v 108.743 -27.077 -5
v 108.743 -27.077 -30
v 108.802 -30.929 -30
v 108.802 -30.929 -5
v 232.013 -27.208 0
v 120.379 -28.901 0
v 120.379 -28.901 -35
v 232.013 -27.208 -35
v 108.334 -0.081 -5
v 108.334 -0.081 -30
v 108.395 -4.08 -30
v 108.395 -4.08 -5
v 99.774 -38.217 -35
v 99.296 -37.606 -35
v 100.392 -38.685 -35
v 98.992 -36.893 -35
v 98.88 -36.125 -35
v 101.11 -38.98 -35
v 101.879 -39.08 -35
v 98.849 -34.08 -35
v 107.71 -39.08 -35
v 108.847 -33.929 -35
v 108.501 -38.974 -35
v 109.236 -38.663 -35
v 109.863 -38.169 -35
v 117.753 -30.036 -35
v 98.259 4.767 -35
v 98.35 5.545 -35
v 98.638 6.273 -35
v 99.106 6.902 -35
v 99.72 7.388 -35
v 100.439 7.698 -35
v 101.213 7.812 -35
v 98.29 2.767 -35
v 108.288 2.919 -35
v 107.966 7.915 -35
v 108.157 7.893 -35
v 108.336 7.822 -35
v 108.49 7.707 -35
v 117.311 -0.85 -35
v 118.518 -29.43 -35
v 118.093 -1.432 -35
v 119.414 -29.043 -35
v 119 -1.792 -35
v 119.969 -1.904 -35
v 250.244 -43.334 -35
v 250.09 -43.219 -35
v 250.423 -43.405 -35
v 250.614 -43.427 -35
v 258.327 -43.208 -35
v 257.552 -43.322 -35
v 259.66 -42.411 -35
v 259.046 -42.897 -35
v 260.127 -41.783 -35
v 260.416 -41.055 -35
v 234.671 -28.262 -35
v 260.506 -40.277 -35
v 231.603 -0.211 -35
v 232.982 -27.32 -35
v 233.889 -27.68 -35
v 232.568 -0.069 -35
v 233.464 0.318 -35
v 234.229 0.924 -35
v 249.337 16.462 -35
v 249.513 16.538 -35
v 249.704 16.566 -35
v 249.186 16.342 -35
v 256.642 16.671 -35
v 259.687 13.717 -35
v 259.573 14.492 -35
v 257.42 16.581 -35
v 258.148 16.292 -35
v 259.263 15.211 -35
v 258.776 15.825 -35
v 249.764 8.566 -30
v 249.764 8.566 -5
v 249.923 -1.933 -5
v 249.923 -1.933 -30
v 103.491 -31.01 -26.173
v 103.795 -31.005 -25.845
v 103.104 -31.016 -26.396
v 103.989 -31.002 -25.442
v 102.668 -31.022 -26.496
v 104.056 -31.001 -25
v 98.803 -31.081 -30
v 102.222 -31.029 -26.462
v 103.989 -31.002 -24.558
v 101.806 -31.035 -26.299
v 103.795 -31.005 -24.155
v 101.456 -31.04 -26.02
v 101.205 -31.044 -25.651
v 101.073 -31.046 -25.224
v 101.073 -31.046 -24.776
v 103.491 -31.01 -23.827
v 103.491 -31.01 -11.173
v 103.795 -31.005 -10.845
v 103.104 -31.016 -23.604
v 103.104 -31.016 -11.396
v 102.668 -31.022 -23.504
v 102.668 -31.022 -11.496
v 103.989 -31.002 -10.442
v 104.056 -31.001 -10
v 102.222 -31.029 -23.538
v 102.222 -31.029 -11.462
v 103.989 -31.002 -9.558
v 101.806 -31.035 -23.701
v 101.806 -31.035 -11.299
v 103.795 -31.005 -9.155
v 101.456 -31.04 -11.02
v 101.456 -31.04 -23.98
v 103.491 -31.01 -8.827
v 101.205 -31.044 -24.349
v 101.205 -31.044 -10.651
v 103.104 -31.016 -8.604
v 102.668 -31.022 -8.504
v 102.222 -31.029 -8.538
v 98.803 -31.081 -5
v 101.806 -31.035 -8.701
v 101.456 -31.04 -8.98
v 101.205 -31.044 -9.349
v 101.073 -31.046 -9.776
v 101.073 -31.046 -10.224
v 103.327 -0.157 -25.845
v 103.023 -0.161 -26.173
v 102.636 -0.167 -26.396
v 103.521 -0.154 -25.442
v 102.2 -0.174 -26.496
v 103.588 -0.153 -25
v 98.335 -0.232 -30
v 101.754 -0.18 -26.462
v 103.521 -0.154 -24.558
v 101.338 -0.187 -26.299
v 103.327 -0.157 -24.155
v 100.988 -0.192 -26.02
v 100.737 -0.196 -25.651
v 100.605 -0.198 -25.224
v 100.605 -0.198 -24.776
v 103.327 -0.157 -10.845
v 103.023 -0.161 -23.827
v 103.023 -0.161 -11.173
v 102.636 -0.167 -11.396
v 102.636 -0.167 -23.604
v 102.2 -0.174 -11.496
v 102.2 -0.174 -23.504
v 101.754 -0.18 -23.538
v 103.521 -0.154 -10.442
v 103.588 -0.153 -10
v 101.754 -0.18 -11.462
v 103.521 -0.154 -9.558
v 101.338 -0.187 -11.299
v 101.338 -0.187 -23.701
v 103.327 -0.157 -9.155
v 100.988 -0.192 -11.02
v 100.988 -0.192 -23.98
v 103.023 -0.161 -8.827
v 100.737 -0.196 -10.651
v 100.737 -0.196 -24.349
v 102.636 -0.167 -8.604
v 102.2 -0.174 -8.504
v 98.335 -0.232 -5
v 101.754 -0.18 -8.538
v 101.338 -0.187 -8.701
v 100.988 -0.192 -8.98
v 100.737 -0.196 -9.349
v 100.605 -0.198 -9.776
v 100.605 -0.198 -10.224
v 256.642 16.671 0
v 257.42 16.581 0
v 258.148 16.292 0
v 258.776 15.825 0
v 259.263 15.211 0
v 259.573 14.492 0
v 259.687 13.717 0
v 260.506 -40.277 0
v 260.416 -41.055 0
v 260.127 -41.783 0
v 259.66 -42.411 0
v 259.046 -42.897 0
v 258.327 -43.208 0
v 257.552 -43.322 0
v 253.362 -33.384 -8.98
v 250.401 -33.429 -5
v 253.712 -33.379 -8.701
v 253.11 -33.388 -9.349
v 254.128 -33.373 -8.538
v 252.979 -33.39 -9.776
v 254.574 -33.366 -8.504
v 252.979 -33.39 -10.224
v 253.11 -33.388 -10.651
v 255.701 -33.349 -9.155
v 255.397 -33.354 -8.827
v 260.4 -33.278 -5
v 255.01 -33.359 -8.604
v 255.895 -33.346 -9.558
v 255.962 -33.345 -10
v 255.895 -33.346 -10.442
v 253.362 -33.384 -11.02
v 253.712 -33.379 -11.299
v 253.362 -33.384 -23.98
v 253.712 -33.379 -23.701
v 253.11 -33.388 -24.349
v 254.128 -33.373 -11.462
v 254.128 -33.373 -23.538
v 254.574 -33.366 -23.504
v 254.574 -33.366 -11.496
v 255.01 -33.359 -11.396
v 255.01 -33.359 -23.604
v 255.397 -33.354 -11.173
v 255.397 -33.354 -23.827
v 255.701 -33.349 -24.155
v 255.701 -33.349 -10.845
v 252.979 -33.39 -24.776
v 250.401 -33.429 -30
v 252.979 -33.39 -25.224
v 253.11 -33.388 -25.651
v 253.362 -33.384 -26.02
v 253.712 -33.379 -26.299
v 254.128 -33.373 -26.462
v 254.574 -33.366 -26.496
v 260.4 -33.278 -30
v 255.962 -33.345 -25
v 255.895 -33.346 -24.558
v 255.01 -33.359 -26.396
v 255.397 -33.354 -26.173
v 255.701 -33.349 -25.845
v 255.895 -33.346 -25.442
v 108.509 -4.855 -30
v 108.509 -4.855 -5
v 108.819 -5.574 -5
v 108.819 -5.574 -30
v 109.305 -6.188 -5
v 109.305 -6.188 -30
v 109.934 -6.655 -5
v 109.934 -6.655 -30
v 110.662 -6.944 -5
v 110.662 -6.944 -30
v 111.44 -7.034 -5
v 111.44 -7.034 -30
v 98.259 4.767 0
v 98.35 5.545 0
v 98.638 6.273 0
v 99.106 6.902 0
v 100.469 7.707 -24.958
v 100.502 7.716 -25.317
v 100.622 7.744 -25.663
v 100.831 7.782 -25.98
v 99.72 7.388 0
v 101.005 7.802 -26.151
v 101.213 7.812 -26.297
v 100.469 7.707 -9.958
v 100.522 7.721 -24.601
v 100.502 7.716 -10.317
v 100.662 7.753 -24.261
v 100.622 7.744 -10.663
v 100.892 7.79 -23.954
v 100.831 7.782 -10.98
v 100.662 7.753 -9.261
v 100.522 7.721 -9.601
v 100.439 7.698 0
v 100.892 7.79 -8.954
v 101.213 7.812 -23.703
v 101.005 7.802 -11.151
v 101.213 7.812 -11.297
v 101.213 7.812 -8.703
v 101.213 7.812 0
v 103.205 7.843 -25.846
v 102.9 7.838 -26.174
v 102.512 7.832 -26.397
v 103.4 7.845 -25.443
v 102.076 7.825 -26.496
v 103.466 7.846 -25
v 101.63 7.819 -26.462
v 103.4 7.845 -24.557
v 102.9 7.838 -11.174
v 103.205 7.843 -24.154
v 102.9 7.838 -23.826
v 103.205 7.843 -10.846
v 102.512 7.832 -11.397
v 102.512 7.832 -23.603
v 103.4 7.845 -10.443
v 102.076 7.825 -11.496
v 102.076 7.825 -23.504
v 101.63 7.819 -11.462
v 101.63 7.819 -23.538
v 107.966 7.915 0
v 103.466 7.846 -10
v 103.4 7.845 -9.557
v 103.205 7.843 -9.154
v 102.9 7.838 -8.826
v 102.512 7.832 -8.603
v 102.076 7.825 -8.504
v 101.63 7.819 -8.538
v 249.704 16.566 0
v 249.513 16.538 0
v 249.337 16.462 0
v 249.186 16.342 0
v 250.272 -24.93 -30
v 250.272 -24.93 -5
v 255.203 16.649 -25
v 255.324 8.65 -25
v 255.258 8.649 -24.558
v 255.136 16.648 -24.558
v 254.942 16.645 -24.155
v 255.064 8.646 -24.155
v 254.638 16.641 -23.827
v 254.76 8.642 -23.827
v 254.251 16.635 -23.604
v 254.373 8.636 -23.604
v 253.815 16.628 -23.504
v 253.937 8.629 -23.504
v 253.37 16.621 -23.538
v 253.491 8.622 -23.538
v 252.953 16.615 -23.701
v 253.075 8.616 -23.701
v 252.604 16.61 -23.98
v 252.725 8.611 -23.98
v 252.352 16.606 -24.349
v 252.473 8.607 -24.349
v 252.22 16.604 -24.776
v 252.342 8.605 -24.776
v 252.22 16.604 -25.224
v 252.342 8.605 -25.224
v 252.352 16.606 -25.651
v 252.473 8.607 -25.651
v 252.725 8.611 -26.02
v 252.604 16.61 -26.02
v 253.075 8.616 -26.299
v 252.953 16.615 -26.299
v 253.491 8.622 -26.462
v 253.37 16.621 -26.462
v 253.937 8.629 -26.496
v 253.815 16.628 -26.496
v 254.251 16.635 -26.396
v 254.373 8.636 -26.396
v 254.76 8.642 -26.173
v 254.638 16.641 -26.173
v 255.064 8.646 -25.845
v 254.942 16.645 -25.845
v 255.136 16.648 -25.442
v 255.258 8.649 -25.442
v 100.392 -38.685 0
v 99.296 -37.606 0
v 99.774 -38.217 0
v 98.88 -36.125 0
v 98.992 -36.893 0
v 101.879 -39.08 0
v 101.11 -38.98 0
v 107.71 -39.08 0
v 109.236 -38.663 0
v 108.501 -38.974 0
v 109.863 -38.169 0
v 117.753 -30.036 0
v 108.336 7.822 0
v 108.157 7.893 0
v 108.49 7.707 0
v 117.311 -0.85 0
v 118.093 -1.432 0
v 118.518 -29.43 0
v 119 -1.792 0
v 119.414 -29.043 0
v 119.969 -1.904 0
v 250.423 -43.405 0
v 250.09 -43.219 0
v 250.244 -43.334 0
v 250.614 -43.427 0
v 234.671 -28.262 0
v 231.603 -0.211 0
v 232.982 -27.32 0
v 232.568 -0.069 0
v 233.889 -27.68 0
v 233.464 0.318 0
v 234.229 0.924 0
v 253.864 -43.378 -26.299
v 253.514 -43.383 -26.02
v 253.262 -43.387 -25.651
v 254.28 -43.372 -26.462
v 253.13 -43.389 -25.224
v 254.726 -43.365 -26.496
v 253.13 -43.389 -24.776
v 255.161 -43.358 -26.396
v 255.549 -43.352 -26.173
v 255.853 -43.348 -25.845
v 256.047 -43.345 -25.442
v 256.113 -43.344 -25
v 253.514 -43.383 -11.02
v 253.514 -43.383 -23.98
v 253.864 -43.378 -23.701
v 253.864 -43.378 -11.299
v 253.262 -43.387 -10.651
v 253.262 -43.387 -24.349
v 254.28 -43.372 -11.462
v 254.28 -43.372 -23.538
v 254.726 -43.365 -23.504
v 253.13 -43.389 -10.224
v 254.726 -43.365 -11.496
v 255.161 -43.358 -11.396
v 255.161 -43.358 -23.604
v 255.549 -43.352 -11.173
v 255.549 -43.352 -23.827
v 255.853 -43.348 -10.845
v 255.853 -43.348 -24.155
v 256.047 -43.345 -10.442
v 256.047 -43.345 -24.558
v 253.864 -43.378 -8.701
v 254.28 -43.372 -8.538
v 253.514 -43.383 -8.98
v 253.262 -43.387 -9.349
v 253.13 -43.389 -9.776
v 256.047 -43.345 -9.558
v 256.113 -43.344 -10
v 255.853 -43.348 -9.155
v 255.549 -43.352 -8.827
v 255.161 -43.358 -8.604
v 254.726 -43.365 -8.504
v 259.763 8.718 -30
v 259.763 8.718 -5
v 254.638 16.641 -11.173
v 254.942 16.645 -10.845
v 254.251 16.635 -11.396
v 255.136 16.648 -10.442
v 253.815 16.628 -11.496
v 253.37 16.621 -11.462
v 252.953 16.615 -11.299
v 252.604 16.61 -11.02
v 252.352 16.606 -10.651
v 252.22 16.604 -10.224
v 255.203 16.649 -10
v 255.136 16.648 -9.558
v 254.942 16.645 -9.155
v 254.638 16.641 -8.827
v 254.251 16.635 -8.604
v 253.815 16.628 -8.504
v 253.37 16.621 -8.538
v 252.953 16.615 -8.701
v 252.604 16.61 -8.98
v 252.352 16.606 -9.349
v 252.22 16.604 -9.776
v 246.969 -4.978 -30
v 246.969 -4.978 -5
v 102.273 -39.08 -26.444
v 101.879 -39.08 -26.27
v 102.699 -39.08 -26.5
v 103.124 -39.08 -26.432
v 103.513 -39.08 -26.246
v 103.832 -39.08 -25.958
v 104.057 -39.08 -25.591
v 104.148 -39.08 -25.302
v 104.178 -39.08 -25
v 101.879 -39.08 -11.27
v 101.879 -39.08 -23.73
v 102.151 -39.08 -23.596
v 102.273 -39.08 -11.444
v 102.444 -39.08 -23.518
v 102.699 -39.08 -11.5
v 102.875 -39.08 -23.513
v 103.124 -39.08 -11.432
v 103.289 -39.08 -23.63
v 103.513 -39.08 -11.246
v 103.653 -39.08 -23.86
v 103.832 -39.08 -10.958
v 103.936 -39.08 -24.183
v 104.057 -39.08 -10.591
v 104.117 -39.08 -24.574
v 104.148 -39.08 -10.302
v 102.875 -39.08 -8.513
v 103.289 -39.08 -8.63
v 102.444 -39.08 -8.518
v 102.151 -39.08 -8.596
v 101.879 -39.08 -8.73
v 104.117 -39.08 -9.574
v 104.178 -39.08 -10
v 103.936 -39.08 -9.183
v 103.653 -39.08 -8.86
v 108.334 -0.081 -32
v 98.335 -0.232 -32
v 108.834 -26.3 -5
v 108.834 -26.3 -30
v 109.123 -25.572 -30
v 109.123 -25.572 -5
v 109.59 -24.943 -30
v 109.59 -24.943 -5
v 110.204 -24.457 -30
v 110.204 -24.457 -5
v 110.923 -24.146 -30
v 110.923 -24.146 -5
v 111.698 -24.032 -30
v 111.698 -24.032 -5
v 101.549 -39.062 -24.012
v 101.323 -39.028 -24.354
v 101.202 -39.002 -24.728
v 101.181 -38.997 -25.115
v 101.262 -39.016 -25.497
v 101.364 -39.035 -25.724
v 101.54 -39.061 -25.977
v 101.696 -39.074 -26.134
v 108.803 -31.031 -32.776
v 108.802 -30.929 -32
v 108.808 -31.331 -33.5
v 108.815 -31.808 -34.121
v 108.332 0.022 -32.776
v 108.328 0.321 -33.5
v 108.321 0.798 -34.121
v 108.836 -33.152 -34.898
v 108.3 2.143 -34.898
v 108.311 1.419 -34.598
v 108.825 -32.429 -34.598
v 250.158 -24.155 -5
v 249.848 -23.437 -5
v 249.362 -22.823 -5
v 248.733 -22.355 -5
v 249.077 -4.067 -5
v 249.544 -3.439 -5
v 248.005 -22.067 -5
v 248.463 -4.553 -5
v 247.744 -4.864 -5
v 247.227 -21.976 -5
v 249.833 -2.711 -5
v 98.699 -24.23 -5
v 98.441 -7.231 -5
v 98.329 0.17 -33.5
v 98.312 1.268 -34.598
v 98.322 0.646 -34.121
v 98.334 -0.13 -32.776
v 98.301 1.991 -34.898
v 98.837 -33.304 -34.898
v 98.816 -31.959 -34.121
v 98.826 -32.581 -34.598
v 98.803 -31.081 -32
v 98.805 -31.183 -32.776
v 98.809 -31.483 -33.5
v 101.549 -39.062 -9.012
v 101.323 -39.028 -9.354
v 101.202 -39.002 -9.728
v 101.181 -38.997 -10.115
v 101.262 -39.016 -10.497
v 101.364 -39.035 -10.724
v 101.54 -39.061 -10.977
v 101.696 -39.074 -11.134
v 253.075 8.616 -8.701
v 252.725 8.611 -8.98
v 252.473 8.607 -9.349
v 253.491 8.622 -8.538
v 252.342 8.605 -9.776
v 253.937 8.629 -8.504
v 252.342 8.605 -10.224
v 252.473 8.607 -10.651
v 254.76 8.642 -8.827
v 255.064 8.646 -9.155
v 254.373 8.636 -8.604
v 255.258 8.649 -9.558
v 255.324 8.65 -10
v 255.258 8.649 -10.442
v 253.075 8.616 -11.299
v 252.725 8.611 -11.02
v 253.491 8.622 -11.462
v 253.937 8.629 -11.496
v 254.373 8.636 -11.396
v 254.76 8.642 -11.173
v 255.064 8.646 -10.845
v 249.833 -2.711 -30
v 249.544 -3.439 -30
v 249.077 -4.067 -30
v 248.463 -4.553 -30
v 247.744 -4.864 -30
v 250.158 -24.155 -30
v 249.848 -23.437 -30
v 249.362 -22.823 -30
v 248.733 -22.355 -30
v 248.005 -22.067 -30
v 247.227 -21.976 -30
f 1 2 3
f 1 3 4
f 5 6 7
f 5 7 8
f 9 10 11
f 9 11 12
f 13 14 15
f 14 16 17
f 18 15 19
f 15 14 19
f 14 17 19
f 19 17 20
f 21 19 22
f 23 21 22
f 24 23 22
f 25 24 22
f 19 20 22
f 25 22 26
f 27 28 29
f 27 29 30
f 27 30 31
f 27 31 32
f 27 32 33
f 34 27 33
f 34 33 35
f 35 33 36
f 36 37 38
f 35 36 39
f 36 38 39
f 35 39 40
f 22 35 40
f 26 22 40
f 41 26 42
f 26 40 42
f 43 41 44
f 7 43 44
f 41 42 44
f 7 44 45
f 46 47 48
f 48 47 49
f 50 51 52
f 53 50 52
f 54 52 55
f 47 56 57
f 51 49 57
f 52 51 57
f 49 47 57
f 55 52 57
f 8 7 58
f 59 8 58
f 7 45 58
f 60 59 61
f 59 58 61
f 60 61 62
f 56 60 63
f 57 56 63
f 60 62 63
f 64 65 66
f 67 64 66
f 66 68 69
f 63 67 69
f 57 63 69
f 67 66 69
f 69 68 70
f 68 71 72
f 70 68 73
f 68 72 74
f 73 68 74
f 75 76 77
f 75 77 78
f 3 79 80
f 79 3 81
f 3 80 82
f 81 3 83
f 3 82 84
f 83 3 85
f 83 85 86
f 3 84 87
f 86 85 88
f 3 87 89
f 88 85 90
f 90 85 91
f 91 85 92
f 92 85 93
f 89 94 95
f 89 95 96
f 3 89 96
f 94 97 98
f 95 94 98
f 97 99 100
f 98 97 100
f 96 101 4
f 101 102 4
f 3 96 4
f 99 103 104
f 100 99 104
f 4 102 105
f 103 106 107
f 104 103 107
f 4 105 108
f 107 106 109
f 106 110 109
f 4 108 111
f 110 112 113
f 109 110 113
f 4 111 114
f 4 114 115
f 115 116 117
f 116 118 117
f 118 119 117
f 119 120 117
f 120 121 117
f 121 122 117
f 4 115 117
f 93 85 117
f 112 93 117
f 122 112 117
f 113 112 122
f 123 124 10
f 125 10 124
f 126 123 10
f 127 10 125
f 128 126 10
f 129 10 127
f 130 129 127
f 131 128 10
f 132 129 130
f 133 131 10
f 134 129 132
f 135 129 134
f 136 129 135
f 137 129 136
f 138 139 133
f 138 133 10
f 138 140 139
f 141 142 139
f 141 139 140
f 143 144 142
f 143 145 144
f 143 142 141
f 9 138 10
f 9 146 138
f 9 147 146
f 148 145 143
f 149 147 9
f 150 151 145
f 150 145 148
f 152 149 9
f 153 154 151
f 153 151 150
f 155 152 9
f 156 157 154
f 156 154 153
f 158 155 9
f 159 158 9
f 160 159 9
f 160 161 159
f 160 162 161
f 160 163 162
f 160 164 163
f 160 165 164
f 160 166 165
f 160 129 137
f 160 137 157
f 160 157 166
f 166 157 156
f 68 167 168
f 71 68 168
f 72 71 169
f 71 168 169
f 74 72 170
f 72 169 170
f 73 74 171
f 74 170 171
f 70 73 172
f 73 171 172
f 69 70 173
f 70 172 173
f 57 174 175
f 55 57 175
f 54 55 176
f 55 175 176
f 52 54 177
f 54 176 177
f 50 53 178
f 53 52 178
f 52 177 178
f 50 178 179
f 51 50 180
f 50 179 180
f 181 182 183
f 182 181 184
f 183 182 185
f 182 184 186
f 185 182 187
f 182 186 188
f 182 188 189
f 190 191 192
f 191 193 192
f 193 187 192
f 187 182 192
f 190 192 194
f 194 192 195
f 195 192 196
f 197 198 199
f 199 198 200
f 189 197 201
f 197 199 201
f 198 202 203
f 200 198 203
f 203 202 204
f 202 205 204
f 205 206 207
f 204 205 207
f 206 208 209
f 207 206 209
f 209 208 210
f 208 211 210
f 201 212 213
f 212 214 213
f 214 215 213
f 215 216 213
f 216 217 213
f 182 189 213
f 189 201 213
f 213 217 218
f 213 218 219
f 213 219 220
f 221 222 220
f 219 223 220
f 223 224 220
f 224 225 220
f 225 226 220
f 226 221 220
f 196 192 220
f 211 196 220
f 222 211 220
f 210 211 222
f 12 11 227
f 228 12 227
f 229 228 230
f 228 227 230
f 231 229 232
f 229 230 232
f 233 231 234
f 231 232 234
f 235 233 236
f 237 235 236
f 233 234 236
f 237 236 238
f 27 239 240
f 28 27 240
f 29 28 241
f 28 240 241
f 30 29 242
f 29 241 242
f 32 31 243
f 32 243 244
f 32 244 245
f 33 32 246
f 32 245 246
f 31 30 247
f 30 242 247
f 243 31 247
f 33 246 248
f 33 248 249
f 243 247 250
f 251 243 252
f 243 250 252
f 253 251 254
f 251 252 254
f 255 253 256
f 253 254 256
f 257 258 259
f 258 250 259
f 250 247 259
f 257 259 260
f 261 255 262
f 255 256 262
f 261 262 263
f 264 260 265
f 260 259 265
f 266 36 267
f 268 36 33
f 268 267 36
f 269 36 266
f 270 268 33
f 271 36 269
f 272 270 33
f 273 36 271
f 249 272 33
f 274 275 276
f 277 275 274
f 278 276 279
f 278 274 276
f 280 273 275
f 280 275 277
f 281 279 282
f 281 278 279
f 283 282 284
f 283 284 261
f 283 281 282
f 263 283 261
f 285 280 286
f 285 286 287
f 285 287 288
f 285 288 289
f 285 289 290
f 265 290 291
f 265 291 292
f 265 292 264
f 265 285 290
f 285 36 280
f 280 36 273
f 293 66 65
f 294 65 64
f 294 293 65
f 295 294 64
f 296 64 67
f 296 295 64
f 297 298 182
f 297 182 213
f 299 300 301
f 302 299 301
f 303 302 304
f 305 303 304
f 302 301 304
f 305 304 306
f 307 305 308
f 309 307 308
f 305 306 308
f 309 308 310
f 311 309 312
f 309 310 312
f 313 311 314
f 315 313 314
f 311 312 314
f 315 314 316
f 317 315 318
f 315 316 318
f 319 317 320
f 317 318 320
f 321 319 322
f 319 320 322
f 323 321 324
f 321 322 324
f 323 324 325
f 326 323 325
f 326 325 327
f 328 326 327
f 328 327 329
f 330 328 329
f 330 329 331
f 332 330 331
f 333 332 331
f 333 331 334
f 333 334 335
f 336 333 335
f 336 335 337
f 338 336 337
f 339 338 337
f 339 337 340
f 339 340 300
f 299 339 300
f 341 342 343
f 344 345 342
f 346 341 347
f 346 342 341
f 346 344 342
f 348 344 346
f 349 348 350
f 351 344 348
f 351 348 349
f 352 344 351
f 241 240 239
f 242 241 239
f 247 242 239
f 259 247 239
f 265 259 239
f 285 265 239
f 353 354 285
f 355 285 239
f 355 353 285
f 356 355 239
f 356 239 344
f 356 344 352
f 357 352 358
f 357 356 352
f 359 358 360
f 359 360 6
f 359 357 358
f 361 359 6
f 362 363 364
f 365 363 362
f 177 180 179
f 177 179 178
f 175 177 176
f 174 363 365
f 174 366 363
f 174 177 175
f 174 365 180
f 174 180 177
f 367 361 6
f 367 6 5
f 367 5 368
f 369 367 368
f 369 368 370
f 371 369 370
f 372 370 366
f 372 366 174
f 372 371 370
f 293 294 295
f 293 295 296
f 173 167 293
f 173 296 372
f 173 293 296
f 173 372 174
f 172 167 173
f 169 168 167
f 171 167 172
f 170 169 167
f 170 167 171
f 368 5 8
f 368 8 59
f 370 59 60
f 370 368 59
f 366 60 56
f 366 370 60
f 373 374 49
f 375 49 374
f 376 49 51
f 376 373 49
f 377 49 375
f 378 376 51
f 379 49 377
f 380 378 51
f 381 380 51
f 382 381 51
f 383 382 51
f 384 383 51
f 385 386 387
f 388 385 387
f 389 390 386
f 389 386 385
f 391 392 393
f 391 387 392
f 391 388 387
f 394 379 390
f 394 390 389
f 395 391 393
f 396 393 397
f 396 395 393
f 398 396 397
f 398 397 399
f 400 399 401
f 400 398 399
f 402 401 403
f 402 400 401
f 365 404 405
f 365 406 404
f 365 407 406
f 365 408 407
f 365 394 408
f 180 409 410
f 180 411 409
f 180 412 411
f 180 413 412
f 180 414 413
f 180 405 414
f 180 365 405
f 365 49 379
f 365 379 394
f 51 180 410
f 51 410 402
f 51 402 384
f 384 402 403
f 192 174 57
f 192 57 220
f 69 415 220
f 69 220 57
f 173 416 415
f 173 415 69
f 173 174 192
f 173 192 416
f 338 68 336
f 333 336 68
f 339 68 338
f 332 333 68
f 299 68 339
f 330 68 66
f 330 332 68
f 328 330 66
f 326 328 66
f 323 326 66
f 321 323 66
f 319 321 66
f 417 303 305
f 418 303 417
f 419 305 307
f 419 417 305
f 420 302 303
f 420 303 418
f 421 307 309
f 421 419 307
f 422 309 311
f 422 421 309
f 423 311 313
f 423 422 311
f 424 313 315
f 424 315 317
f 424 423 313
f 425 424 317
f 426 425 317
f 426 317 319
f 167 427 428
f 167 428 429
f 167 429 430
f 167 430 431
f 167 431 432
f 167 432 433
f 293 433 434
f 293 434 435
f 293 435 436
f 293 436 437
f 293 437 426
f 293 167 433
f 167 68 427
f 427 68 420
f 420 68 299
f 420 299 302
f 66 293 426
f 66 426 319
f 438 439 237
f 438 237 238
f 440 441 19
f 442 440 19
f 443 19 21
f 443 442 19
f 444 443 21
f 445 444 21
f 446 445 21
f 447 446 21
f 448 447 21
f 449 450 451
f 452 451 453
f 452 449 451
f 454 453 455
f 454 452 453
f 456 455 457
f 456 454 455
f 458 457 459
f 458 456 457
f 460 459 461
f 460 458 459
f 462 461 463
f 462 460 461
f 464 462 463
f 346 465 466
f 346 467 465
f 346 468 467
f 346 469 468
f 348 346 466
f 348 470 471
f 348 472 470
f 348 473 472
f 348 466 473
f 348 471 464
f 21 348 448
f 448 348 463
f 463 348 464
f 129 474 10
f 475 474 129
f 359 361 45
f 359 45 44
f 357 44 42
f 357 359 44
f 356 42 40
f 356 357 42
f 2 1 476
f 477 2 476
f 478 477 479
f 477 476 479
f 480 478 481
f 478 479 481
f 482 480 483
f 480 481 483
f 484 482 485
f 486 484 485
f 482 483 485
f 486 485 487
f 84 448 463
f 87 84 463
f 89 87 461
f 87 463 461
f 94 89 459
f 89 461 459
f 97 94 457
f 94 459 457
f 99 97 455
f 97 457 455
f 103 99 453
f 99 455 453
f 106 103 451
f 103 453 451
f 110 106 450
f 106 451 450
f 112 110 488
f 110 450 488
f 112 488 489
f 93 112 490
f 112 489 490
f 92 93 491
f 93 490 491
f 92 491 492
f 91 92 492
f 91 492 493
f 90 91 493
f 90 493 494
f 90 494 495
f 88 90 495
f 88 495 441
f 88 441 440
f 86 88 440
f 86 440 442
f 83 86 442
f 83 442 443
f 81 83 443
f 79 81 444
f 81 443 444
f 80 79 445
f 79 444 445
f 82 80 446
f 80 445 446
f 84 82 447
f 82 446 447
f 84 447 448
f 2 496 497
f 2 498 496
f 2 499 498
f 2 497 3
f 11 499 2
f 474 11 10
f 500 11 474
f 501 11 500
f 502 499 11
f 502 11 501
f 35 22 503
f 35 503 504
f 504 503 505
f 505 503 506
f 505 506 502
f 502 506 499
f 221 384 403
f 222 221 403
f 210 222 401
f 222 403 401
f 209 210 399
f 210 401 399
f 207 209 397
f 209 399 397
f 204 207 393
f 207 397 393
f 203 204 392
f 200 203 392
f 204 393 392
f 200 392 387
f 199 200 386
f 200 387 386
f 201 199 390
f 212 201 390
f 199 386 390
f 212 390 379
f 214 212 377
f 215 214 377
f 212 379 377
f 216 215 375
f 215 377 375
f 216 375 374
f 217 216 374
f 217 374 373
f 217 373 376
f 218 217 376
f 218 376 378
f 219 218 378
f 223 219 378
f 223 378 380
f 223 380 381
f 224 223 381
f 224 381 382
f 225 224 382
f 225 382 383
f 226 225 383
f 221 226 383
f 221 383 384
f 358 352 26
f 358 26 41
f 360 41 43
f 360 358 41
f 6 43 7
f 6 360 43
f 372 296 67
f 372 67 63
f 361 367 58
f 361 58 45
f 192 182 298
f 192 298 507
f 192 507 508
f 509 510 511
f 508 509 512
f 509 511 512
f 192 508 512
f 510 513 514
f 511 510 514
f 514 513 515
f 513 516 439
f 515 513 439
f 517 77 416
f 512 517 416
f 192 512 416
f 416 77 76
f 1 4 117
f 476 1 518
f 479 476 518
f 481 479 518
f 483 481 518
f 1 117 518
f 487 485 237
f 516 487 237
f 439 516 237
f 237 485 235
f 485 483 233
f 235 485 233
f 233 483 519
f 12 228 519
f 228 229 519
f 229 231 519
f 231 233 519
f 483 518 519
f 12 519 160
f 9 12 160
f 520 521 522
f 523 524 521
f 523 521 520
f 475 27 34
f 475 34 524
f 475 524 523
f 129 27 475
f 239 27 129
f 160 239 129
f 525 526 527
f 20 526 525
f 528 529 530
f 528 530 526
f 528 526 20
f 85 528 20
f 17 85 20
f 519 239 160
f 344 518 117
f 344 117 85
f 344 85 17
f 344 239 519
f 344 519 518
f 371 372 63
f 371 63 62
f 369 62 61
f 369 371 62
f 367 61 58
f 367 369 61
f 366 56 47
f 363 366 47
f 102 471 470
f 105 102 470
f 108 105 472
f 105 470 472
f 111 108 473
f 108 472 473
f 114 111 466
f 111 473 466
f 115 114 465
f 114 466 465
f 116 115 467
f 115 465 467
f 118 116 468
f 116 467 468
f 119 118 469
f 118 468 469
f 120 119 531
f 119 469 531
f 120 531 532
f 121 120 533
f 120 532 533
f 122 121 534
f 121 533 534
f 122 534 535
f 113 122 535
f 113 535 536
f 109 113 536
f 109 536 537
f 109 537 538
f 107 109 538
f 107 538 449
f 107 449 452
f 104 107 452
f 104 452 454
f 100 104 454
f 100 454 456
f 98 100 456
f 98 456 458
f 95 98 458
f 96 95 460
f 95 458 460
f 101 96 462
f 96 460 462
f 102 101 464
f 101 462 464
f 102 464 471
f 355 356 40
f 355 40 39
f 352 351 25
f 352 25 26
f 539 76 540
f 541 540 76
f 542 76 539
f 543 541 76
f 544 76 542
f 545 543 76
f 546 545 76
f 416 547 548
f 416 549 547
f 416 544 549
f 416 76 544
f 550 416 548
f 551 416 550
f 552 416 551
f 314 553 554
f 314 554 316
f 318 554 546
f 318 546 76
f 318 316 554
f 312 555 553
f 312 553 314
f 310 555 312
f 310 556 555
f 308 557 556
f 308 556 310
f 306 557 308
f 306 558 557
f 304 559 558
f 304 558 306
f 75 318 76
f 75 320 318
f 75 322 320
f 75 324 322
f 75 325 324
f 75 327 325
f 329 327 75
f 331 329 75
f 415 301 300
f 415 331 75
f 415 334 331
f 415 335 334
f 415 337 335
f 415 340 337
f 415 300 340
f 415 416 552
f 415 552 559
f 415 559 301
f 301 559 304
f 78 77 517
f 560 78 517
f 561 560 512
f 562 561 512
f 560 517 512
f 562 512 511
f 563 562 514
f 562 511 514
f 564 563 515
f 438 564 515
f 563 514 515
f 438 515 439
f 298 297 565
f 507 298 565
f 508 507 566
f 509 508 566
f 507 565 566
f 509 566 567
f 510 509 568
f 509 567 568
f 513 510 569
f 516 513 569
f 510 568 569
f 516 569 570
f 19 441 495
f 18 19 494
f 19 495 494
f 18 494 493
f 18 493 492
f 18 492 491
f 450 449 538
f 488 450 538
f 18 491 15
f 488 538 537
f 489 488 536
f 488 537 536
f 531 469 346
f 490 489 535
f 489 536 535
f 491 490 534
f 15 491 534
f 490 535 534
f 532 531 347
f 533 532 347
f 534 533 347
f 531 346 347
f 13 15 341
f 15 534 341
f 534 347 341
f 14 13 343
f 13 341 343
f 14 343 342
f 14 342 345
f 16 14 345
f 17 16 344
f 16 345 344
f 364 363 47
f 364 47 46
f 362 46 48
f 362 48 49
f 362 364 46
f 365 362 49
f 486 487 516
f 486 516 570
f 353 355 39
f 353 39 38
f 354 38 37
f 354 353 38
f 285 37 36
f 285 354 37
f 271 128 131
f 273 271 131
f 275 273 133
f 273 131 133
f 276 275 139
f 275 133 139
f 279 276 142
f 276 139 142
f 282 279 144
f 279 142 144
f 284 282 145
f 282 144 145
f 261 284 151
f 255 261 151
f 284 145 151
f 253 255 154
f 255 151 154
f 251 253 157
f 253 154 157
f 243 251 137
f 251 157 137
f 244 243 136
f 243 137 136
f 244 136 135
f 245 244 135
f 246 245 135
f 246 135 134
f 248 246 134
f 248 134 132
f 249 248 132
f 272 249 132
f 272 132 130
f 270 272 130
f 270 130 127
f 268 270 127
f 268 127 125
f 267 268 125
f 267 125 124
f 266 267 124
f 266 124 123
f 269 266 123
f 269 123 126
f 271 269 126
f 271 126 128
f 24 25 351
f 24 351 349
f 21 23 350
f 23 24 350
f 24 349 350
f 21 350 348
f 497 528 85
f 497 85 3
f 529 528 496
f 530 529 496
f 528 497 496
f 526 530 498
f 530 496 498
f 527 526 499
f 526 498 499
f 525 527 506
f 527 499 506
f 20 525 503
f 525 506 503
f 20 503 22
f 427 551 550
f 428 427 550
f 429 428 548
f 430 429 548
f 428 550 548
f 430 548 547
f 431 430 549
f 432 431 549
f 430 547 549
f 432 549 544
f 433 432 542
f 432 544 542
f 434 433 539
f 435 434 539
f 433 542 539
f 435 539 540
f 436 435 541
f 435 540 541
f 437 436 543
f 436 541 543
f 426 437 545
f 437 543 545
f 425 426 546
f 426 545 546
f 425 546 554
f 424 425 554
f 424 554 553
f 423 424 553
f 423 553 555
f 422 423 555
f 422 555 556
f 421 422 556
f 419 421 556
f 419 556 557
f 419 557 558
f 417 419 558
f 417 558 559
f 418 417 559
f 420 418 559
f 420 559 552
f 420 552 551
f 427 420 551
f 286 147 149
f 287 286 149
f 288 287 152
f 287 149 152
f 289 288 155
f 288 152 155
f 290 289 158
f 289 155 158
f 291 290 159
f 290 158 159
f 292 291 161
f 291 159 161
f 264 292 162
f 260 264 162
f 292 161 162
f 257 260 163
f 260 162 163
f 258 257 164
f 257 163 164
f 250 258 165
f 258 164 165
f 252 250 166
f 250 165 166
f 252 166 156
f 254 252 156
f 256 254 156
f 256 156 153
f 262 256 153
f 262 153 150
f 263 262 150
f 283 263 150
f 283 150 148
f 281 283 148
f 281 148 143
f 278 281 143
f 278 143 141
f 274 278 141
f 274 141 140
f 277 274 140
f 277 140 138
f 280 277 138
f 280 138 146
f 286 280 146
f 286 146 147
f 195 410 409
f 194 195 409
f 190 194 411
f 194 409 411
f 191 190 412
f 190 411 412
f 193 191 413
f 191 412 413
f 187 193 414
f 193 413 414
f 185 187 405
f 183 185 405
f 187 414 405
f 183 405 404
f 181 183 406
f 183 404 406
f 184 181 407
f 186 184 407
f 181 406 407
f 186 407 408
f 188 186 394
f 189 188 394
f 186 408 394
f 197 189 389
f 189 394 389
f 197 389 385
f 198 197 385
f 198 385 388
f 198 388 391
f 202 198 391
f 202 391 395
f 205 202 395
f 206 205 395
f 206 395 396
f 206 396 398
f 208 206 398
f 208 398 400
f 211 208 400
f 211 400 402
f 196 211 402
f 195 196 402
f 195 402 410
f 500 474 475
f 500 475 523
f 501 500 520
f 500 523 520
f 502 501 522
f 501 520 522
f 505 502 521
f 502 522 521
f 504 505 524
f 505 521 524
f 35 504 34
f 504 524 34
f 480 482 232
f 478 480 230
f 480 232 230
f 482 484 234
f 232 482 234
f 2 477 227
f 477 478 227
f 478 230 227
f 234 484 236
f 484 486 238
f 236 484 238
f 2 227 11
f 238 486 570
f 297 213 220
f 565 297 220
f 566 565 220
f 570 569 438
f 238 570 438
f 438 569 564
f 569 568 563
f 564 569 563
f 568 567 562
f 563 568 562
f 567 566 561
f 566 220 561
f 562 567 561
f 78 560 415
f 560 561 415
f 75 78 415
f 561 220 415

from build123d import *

# Parameters (mm, degrees)
EXTRUDE_1_DEPTH     = 35
SKETCH_2_W          = 25
SKETCH_2_H          = 17
CUT_EXTRUDE_1_DEPTH = 173.018757571
SKETCH_4_W          = 25
SKETCH_4_H          = 13.5
SKETCH_4_H_2        = 11.5
CUT_EXTRUDE_2_DEPTH = 10
SKETCH_7_W          = 25
SKETCH_7_H          = 7
SKETCH_7_H_2        = 6.852029594
CUT_EXTRUDE_5_DEPTH = 10
FILLET_1_R          = 3
SKETCH_9_R          = 1.5
CUT_EXTRUDE_6_DEPTH = 270.810917265
CUT_EXTRUDE_8_DEPTH = 10
FILLET_3_R          = 3


with BuildPart() as part:
    # 草图1 → 凸台-拉伸1 (new body)
    with BuildSketch(Plane.XY):
        with BuildLine():
            Line((107.965790756, 7.914761882), (98.213694846, 7.766808503))
            Line((98.213694846, 7.766808503), (98.92442601, -39.079829993))
            Line((98.92442601, -39.079829993), (108.678766587, -39.079829993))
            ThreePointArc((108.678766587, -39.079829993), (108.959768197, -39.019490003), (109.19628872, -38.856208462))
            Line((109.19628872, -38.856208462), (117.753296763, -30.035556214))
            ThreePointArc((117.753296763, -30.035556214), (118.95311021, -29.207267035), (120.378565842, -28.901176343))
            Line((120.378565842, -28.901176343), (232.012858889, -27.207522891))
            ThreePointArc((232.012858889, -27.207522891), (233.446944009, -27.470230219), (234.671332156, -28.261740759))
            Line((234.671332156, -28.261740759), (250.089839512, -43.21939783))
            ThreePointArc((250.089839512, -43.21939783), (250.331204472, -43.375429159), (250.613907223, -43.427216939))
            Line((250.613907223, -43.427216939), (260.551832391, -43.276444261))
            Line((260.551832391, -43.276444261), (259.64165048, 16.716651749))
            Line((259.64165048, 16.716651749), (249.703725312, 16.565879071))
            ThreePointArc((249.703725312, 16.565879071), (249.422723701, 16.505539082), (249.186203178, 16.34225754))
            Line((249.186203178, 16.34225754), (234.228546108, 0.923750185))
            ThreePointArc((234.228546108, 0.923750185), (233.028732661, 0.095461006), (231.603277029, -0.210629686))
            Line((231.603277029, -0.210629686), (119.968983982, -1.904283139))
            ThreePointArc((119.968983982, -1.904283139), (118.534898862, -1.64157581), (117.310510715, -0.85006527))
            Line((117.310510715, -0.85006527), (108.489858467, 7.706942773))
            ThreePointArc((108.489858467, 7.706942773), (108.248493507, 7.862974102), (107.965790756, 7.914761882))
        make_face()
    extrude(amount=-EXTRUDE_1_DEPTH)

    # 草图2 → 切除-拉伸1 (cut, through all)
    with BuildSketch(Plane(origin=(259.835459196, 3.942079181, 0), x_dir=(0, 0, -1), z_dir=(0.999884933503295, 0.01516969851748372, 0))):
        with Locations((17.5, -17.223957338)):
            Rectangle(SKETCH_2_W, SKETCH_2_H)
    extrude(amount=-CUT_EXTRUDE_1_DEPTH, mode=Mode.SUBTRACT)

    # 草图4 → 切除-拉伸2 (cut)
    with BuildSketch(Plane(origin=(259.835459196, 3.942079181, 0), x_dir=(0, 0, -1), z_dir=(0.999884933503295, 0.01516969851748372, 0))):
        with Locations((17.5, -1.973957338)):
            Rectangle(SKETCH_4_W, SKETCH_4_H)
        with Locations((17.5, -31.473957338)):
            Rectangle(SKETCH_4_W, SKETCH_4_H_2)
    extrude(amount=-CUT_EXTRUDE_2_DEPTH, mode=Mode.SUBTRACT)

    # 草图7 → 切除-拉伸5 (cut)
    with BuildSketch(Plane(origin=(98.308900521, 1.491488003, 0), x_dir=(0, 0, 1), z_dir=(-0.9998849335032951, -0.015169698517482276, 0))):
        with Locations((-17.5, -5.223957338)):
            Rectangle(SKETCH_7_W, SKETCH_7_H)
        with Locations((-17.5, -29.149972135)):
            Rectangle(SKETCH_7_W, SKETCH_7_H_2)
    extrude(amount=-CUT_EXTRUDE_5_DEPTH, mode=Mode.SUBTRACT)

    # 圆角1
    # the kernel refuses this fillet: 3 mm, written as the material it takes off along each edge
    with BuildSketch(Plane(origin=(250.226834538, -21.930615176, -30), x_dir=(0.01516969851748703, -0.9998849335032949, 0), z_dir=(0, 0, 1)), Plane(origin=(249.968949663, -4.932571306, -5), x_dir=(-0.015169698517477554, 0.999884933503295, 0), z_dir=(0, 0, -1))) as fillet_1_piece_1:
        with BuildLine():
            CenterArc((FILLET_1_R, -FILLET_1_R), FILLET_1_R, 90, 90)
            Line((0, -FILLET_1_R), (0, 0))
            Line((0, 0), (FILLET_1_R, 0))
        make_face()
    extrude(amount=25, mode=Mode.SUBTRACT)
    with BuildSketch(Plane(origin=(98.92442601, -39.079829993, 7.387077266), x_dir=(1, 0, 0), z_dir=(0, 0, -1))) as fillet_1_piece_2:
        with BuildLine():
            CenterArc((FILLET_1_R * 0.984943635496, -FILLET_1_R), FILLET_1_R, 90, 89.13080696)
            Line((-FILLET_1_R * 0.0149412980072, -FILLET_1_R * 0.984830301483), (0, 0))
            Line((0, 0), (FILLET_1_R * 0.984943635496, 0))
        make_face()
    extrude(amount=49.774154532, mode=Mode.SUBTRACT)
    with BuildSketch(Plane(origin=(108.678766587, -39.079829993, 3.735844088), x_dir=(0.7926292381316349, 0.6097039370537671, 0), z_dir=(0, 0, -1))) as fillet_1_piece_3:
        with BuildLine():
            CenterArc((1.061212336, -2.968569096), FILLET_1_R, 81.698905724, 45.86919304)
            Line((-0.767899475, -0.590681381), (-0.950810656, -0.35289261))
            Line((-0.950810656, -0.35289261), (-0.182911181, 0.237788771))
            Line((-0.182911181, 0.237788771), (-0.17928295, 0.240536117))
            ThreePointArc((-0.17928295, 0.240536117), (0.589858632, 0.435143228), (1.537650165, 0.29685691))
            Line((1.537650165, 0.29685691), (1.494337635, 0))
        make_face()
    extrude(amount=42.471688176, mode=Mode.SUBTRACT)
    with BuildSketch(Plane(origin=(260.551832391, -43.276444261, 7.5), x_dir=(-0.015169698517487012, 0.9998849335032949, 0), z_dir=(0, 0, -1)), Plane(origin=(98.213694846, 7.766808503, 7.5), x_dir=(0.015169698517482278, -0.999884933503295, 0), z_dir=(0, 0, -1))) as fillet_1_piece_4:
        with BuildLine():
            CenterArc((FILLET_1_R, -FILLET_1_R), FILLET_1_R, 90, 90)
            Line((0, -FILLET_1_R), (0, 0))
            Line((0, 0), (FILLET_1_R, 0))
        make_face()
    extrude(amount=50, mode=Mode.SUBTRACT)
    with BuildSketch(Plane(origin=(259.64165048, 16.716651749, 7.5), x_dir=(0.015169698517487083, -0.9998849335032949, 0), z_dir=(0, 0, -1))) as fillet_1_piece_5:
        with BuildLine():
            CenterArc((FILLET_1_R, FILLET_1_R), FILLET_1_R, 180, 90)
            Line((0, FILLET_1_R), (0, 0))
            Line((0, 0), (FILLET_1_R, 0))
        make_face()
    extrude(amount=50, mode=Mode.SUBTRACT)
    with BuildSketch(Plane(origin=(108.440089659, -7.079768515, -30), x_dir=(0.9998849335032949, 0.015169698517490995, 0), z_dir=(0, 0, 1)), Plane(origin=(108.697974533, -24.077812384, -5), x_dir=(0.9998849335032949, 0.015169698517490636, 0), z_dir=(0, 0, -1))) as fillet_1_piece_6:
        with BuildLine():
            CenterArc((FILLET_1_R, FILLET_1_R), FILLET_1_R, 180, 90)
            Line((0, FILLET_1_R), (0, 0))
            Line((0, 0), (FILLET_1_R, 0))
        make_face()
    extrude(amount=25, mode=Mode.SUBTRACT)

    # 草图9 → 切除-拉伸6 (cut, through all)
    with BuildSketch(Plane(origin=(0.716373196, -47.218523443, 0), x_dir=(0.999884933503295, 0.015169698517483048, 0), z_dir=(0.015169698517483048, -0.999884933503295, 0))):
        with Locations((253.92629217, -25)):
            Circle(SKETCH_9_R)
        with Locations((253.92629217, -10)):
            Circle(SKETCH_9_R)
        with Locations((102.073432063, -10)):
            Circle(SKETCH_9_R)
        with Locations((102.073432063, -25)):
            Circle(SKETCH_9_R)
    extrude(amount=-CUT_EXTRUDE_6_DEPTH, mode=Mode.SUBTRACT)

    # 草图11 → 切除-拉伸8 (cut)
    with BuildSketch(Plane(origin=(0, 0, -35), x_dir=(-1, 0, 0), z_dir=(0, 0, -1))):
        Polygon((-98.335052434, -0.232270965), (-98.803068421, -31.080750525), (-108.801917756, -30.929053539), (-108.333901769, -0.08057398), align=None)
    extrude(amount=-CUT_EXTRUDE_8_DEPTH, mode=Mode.SUBTRACT)

    # 圆角3
    fillet_3_edges = [part.edges().sort_by_distance(p)[0] for p in [
        (103.334477101, -0.156422473, -35),
        (103.802493089, -31.004902032, -35),
    ]]
    fillet(fillet_3_edges, radius=FILLET_3_R)


solid = part.part
